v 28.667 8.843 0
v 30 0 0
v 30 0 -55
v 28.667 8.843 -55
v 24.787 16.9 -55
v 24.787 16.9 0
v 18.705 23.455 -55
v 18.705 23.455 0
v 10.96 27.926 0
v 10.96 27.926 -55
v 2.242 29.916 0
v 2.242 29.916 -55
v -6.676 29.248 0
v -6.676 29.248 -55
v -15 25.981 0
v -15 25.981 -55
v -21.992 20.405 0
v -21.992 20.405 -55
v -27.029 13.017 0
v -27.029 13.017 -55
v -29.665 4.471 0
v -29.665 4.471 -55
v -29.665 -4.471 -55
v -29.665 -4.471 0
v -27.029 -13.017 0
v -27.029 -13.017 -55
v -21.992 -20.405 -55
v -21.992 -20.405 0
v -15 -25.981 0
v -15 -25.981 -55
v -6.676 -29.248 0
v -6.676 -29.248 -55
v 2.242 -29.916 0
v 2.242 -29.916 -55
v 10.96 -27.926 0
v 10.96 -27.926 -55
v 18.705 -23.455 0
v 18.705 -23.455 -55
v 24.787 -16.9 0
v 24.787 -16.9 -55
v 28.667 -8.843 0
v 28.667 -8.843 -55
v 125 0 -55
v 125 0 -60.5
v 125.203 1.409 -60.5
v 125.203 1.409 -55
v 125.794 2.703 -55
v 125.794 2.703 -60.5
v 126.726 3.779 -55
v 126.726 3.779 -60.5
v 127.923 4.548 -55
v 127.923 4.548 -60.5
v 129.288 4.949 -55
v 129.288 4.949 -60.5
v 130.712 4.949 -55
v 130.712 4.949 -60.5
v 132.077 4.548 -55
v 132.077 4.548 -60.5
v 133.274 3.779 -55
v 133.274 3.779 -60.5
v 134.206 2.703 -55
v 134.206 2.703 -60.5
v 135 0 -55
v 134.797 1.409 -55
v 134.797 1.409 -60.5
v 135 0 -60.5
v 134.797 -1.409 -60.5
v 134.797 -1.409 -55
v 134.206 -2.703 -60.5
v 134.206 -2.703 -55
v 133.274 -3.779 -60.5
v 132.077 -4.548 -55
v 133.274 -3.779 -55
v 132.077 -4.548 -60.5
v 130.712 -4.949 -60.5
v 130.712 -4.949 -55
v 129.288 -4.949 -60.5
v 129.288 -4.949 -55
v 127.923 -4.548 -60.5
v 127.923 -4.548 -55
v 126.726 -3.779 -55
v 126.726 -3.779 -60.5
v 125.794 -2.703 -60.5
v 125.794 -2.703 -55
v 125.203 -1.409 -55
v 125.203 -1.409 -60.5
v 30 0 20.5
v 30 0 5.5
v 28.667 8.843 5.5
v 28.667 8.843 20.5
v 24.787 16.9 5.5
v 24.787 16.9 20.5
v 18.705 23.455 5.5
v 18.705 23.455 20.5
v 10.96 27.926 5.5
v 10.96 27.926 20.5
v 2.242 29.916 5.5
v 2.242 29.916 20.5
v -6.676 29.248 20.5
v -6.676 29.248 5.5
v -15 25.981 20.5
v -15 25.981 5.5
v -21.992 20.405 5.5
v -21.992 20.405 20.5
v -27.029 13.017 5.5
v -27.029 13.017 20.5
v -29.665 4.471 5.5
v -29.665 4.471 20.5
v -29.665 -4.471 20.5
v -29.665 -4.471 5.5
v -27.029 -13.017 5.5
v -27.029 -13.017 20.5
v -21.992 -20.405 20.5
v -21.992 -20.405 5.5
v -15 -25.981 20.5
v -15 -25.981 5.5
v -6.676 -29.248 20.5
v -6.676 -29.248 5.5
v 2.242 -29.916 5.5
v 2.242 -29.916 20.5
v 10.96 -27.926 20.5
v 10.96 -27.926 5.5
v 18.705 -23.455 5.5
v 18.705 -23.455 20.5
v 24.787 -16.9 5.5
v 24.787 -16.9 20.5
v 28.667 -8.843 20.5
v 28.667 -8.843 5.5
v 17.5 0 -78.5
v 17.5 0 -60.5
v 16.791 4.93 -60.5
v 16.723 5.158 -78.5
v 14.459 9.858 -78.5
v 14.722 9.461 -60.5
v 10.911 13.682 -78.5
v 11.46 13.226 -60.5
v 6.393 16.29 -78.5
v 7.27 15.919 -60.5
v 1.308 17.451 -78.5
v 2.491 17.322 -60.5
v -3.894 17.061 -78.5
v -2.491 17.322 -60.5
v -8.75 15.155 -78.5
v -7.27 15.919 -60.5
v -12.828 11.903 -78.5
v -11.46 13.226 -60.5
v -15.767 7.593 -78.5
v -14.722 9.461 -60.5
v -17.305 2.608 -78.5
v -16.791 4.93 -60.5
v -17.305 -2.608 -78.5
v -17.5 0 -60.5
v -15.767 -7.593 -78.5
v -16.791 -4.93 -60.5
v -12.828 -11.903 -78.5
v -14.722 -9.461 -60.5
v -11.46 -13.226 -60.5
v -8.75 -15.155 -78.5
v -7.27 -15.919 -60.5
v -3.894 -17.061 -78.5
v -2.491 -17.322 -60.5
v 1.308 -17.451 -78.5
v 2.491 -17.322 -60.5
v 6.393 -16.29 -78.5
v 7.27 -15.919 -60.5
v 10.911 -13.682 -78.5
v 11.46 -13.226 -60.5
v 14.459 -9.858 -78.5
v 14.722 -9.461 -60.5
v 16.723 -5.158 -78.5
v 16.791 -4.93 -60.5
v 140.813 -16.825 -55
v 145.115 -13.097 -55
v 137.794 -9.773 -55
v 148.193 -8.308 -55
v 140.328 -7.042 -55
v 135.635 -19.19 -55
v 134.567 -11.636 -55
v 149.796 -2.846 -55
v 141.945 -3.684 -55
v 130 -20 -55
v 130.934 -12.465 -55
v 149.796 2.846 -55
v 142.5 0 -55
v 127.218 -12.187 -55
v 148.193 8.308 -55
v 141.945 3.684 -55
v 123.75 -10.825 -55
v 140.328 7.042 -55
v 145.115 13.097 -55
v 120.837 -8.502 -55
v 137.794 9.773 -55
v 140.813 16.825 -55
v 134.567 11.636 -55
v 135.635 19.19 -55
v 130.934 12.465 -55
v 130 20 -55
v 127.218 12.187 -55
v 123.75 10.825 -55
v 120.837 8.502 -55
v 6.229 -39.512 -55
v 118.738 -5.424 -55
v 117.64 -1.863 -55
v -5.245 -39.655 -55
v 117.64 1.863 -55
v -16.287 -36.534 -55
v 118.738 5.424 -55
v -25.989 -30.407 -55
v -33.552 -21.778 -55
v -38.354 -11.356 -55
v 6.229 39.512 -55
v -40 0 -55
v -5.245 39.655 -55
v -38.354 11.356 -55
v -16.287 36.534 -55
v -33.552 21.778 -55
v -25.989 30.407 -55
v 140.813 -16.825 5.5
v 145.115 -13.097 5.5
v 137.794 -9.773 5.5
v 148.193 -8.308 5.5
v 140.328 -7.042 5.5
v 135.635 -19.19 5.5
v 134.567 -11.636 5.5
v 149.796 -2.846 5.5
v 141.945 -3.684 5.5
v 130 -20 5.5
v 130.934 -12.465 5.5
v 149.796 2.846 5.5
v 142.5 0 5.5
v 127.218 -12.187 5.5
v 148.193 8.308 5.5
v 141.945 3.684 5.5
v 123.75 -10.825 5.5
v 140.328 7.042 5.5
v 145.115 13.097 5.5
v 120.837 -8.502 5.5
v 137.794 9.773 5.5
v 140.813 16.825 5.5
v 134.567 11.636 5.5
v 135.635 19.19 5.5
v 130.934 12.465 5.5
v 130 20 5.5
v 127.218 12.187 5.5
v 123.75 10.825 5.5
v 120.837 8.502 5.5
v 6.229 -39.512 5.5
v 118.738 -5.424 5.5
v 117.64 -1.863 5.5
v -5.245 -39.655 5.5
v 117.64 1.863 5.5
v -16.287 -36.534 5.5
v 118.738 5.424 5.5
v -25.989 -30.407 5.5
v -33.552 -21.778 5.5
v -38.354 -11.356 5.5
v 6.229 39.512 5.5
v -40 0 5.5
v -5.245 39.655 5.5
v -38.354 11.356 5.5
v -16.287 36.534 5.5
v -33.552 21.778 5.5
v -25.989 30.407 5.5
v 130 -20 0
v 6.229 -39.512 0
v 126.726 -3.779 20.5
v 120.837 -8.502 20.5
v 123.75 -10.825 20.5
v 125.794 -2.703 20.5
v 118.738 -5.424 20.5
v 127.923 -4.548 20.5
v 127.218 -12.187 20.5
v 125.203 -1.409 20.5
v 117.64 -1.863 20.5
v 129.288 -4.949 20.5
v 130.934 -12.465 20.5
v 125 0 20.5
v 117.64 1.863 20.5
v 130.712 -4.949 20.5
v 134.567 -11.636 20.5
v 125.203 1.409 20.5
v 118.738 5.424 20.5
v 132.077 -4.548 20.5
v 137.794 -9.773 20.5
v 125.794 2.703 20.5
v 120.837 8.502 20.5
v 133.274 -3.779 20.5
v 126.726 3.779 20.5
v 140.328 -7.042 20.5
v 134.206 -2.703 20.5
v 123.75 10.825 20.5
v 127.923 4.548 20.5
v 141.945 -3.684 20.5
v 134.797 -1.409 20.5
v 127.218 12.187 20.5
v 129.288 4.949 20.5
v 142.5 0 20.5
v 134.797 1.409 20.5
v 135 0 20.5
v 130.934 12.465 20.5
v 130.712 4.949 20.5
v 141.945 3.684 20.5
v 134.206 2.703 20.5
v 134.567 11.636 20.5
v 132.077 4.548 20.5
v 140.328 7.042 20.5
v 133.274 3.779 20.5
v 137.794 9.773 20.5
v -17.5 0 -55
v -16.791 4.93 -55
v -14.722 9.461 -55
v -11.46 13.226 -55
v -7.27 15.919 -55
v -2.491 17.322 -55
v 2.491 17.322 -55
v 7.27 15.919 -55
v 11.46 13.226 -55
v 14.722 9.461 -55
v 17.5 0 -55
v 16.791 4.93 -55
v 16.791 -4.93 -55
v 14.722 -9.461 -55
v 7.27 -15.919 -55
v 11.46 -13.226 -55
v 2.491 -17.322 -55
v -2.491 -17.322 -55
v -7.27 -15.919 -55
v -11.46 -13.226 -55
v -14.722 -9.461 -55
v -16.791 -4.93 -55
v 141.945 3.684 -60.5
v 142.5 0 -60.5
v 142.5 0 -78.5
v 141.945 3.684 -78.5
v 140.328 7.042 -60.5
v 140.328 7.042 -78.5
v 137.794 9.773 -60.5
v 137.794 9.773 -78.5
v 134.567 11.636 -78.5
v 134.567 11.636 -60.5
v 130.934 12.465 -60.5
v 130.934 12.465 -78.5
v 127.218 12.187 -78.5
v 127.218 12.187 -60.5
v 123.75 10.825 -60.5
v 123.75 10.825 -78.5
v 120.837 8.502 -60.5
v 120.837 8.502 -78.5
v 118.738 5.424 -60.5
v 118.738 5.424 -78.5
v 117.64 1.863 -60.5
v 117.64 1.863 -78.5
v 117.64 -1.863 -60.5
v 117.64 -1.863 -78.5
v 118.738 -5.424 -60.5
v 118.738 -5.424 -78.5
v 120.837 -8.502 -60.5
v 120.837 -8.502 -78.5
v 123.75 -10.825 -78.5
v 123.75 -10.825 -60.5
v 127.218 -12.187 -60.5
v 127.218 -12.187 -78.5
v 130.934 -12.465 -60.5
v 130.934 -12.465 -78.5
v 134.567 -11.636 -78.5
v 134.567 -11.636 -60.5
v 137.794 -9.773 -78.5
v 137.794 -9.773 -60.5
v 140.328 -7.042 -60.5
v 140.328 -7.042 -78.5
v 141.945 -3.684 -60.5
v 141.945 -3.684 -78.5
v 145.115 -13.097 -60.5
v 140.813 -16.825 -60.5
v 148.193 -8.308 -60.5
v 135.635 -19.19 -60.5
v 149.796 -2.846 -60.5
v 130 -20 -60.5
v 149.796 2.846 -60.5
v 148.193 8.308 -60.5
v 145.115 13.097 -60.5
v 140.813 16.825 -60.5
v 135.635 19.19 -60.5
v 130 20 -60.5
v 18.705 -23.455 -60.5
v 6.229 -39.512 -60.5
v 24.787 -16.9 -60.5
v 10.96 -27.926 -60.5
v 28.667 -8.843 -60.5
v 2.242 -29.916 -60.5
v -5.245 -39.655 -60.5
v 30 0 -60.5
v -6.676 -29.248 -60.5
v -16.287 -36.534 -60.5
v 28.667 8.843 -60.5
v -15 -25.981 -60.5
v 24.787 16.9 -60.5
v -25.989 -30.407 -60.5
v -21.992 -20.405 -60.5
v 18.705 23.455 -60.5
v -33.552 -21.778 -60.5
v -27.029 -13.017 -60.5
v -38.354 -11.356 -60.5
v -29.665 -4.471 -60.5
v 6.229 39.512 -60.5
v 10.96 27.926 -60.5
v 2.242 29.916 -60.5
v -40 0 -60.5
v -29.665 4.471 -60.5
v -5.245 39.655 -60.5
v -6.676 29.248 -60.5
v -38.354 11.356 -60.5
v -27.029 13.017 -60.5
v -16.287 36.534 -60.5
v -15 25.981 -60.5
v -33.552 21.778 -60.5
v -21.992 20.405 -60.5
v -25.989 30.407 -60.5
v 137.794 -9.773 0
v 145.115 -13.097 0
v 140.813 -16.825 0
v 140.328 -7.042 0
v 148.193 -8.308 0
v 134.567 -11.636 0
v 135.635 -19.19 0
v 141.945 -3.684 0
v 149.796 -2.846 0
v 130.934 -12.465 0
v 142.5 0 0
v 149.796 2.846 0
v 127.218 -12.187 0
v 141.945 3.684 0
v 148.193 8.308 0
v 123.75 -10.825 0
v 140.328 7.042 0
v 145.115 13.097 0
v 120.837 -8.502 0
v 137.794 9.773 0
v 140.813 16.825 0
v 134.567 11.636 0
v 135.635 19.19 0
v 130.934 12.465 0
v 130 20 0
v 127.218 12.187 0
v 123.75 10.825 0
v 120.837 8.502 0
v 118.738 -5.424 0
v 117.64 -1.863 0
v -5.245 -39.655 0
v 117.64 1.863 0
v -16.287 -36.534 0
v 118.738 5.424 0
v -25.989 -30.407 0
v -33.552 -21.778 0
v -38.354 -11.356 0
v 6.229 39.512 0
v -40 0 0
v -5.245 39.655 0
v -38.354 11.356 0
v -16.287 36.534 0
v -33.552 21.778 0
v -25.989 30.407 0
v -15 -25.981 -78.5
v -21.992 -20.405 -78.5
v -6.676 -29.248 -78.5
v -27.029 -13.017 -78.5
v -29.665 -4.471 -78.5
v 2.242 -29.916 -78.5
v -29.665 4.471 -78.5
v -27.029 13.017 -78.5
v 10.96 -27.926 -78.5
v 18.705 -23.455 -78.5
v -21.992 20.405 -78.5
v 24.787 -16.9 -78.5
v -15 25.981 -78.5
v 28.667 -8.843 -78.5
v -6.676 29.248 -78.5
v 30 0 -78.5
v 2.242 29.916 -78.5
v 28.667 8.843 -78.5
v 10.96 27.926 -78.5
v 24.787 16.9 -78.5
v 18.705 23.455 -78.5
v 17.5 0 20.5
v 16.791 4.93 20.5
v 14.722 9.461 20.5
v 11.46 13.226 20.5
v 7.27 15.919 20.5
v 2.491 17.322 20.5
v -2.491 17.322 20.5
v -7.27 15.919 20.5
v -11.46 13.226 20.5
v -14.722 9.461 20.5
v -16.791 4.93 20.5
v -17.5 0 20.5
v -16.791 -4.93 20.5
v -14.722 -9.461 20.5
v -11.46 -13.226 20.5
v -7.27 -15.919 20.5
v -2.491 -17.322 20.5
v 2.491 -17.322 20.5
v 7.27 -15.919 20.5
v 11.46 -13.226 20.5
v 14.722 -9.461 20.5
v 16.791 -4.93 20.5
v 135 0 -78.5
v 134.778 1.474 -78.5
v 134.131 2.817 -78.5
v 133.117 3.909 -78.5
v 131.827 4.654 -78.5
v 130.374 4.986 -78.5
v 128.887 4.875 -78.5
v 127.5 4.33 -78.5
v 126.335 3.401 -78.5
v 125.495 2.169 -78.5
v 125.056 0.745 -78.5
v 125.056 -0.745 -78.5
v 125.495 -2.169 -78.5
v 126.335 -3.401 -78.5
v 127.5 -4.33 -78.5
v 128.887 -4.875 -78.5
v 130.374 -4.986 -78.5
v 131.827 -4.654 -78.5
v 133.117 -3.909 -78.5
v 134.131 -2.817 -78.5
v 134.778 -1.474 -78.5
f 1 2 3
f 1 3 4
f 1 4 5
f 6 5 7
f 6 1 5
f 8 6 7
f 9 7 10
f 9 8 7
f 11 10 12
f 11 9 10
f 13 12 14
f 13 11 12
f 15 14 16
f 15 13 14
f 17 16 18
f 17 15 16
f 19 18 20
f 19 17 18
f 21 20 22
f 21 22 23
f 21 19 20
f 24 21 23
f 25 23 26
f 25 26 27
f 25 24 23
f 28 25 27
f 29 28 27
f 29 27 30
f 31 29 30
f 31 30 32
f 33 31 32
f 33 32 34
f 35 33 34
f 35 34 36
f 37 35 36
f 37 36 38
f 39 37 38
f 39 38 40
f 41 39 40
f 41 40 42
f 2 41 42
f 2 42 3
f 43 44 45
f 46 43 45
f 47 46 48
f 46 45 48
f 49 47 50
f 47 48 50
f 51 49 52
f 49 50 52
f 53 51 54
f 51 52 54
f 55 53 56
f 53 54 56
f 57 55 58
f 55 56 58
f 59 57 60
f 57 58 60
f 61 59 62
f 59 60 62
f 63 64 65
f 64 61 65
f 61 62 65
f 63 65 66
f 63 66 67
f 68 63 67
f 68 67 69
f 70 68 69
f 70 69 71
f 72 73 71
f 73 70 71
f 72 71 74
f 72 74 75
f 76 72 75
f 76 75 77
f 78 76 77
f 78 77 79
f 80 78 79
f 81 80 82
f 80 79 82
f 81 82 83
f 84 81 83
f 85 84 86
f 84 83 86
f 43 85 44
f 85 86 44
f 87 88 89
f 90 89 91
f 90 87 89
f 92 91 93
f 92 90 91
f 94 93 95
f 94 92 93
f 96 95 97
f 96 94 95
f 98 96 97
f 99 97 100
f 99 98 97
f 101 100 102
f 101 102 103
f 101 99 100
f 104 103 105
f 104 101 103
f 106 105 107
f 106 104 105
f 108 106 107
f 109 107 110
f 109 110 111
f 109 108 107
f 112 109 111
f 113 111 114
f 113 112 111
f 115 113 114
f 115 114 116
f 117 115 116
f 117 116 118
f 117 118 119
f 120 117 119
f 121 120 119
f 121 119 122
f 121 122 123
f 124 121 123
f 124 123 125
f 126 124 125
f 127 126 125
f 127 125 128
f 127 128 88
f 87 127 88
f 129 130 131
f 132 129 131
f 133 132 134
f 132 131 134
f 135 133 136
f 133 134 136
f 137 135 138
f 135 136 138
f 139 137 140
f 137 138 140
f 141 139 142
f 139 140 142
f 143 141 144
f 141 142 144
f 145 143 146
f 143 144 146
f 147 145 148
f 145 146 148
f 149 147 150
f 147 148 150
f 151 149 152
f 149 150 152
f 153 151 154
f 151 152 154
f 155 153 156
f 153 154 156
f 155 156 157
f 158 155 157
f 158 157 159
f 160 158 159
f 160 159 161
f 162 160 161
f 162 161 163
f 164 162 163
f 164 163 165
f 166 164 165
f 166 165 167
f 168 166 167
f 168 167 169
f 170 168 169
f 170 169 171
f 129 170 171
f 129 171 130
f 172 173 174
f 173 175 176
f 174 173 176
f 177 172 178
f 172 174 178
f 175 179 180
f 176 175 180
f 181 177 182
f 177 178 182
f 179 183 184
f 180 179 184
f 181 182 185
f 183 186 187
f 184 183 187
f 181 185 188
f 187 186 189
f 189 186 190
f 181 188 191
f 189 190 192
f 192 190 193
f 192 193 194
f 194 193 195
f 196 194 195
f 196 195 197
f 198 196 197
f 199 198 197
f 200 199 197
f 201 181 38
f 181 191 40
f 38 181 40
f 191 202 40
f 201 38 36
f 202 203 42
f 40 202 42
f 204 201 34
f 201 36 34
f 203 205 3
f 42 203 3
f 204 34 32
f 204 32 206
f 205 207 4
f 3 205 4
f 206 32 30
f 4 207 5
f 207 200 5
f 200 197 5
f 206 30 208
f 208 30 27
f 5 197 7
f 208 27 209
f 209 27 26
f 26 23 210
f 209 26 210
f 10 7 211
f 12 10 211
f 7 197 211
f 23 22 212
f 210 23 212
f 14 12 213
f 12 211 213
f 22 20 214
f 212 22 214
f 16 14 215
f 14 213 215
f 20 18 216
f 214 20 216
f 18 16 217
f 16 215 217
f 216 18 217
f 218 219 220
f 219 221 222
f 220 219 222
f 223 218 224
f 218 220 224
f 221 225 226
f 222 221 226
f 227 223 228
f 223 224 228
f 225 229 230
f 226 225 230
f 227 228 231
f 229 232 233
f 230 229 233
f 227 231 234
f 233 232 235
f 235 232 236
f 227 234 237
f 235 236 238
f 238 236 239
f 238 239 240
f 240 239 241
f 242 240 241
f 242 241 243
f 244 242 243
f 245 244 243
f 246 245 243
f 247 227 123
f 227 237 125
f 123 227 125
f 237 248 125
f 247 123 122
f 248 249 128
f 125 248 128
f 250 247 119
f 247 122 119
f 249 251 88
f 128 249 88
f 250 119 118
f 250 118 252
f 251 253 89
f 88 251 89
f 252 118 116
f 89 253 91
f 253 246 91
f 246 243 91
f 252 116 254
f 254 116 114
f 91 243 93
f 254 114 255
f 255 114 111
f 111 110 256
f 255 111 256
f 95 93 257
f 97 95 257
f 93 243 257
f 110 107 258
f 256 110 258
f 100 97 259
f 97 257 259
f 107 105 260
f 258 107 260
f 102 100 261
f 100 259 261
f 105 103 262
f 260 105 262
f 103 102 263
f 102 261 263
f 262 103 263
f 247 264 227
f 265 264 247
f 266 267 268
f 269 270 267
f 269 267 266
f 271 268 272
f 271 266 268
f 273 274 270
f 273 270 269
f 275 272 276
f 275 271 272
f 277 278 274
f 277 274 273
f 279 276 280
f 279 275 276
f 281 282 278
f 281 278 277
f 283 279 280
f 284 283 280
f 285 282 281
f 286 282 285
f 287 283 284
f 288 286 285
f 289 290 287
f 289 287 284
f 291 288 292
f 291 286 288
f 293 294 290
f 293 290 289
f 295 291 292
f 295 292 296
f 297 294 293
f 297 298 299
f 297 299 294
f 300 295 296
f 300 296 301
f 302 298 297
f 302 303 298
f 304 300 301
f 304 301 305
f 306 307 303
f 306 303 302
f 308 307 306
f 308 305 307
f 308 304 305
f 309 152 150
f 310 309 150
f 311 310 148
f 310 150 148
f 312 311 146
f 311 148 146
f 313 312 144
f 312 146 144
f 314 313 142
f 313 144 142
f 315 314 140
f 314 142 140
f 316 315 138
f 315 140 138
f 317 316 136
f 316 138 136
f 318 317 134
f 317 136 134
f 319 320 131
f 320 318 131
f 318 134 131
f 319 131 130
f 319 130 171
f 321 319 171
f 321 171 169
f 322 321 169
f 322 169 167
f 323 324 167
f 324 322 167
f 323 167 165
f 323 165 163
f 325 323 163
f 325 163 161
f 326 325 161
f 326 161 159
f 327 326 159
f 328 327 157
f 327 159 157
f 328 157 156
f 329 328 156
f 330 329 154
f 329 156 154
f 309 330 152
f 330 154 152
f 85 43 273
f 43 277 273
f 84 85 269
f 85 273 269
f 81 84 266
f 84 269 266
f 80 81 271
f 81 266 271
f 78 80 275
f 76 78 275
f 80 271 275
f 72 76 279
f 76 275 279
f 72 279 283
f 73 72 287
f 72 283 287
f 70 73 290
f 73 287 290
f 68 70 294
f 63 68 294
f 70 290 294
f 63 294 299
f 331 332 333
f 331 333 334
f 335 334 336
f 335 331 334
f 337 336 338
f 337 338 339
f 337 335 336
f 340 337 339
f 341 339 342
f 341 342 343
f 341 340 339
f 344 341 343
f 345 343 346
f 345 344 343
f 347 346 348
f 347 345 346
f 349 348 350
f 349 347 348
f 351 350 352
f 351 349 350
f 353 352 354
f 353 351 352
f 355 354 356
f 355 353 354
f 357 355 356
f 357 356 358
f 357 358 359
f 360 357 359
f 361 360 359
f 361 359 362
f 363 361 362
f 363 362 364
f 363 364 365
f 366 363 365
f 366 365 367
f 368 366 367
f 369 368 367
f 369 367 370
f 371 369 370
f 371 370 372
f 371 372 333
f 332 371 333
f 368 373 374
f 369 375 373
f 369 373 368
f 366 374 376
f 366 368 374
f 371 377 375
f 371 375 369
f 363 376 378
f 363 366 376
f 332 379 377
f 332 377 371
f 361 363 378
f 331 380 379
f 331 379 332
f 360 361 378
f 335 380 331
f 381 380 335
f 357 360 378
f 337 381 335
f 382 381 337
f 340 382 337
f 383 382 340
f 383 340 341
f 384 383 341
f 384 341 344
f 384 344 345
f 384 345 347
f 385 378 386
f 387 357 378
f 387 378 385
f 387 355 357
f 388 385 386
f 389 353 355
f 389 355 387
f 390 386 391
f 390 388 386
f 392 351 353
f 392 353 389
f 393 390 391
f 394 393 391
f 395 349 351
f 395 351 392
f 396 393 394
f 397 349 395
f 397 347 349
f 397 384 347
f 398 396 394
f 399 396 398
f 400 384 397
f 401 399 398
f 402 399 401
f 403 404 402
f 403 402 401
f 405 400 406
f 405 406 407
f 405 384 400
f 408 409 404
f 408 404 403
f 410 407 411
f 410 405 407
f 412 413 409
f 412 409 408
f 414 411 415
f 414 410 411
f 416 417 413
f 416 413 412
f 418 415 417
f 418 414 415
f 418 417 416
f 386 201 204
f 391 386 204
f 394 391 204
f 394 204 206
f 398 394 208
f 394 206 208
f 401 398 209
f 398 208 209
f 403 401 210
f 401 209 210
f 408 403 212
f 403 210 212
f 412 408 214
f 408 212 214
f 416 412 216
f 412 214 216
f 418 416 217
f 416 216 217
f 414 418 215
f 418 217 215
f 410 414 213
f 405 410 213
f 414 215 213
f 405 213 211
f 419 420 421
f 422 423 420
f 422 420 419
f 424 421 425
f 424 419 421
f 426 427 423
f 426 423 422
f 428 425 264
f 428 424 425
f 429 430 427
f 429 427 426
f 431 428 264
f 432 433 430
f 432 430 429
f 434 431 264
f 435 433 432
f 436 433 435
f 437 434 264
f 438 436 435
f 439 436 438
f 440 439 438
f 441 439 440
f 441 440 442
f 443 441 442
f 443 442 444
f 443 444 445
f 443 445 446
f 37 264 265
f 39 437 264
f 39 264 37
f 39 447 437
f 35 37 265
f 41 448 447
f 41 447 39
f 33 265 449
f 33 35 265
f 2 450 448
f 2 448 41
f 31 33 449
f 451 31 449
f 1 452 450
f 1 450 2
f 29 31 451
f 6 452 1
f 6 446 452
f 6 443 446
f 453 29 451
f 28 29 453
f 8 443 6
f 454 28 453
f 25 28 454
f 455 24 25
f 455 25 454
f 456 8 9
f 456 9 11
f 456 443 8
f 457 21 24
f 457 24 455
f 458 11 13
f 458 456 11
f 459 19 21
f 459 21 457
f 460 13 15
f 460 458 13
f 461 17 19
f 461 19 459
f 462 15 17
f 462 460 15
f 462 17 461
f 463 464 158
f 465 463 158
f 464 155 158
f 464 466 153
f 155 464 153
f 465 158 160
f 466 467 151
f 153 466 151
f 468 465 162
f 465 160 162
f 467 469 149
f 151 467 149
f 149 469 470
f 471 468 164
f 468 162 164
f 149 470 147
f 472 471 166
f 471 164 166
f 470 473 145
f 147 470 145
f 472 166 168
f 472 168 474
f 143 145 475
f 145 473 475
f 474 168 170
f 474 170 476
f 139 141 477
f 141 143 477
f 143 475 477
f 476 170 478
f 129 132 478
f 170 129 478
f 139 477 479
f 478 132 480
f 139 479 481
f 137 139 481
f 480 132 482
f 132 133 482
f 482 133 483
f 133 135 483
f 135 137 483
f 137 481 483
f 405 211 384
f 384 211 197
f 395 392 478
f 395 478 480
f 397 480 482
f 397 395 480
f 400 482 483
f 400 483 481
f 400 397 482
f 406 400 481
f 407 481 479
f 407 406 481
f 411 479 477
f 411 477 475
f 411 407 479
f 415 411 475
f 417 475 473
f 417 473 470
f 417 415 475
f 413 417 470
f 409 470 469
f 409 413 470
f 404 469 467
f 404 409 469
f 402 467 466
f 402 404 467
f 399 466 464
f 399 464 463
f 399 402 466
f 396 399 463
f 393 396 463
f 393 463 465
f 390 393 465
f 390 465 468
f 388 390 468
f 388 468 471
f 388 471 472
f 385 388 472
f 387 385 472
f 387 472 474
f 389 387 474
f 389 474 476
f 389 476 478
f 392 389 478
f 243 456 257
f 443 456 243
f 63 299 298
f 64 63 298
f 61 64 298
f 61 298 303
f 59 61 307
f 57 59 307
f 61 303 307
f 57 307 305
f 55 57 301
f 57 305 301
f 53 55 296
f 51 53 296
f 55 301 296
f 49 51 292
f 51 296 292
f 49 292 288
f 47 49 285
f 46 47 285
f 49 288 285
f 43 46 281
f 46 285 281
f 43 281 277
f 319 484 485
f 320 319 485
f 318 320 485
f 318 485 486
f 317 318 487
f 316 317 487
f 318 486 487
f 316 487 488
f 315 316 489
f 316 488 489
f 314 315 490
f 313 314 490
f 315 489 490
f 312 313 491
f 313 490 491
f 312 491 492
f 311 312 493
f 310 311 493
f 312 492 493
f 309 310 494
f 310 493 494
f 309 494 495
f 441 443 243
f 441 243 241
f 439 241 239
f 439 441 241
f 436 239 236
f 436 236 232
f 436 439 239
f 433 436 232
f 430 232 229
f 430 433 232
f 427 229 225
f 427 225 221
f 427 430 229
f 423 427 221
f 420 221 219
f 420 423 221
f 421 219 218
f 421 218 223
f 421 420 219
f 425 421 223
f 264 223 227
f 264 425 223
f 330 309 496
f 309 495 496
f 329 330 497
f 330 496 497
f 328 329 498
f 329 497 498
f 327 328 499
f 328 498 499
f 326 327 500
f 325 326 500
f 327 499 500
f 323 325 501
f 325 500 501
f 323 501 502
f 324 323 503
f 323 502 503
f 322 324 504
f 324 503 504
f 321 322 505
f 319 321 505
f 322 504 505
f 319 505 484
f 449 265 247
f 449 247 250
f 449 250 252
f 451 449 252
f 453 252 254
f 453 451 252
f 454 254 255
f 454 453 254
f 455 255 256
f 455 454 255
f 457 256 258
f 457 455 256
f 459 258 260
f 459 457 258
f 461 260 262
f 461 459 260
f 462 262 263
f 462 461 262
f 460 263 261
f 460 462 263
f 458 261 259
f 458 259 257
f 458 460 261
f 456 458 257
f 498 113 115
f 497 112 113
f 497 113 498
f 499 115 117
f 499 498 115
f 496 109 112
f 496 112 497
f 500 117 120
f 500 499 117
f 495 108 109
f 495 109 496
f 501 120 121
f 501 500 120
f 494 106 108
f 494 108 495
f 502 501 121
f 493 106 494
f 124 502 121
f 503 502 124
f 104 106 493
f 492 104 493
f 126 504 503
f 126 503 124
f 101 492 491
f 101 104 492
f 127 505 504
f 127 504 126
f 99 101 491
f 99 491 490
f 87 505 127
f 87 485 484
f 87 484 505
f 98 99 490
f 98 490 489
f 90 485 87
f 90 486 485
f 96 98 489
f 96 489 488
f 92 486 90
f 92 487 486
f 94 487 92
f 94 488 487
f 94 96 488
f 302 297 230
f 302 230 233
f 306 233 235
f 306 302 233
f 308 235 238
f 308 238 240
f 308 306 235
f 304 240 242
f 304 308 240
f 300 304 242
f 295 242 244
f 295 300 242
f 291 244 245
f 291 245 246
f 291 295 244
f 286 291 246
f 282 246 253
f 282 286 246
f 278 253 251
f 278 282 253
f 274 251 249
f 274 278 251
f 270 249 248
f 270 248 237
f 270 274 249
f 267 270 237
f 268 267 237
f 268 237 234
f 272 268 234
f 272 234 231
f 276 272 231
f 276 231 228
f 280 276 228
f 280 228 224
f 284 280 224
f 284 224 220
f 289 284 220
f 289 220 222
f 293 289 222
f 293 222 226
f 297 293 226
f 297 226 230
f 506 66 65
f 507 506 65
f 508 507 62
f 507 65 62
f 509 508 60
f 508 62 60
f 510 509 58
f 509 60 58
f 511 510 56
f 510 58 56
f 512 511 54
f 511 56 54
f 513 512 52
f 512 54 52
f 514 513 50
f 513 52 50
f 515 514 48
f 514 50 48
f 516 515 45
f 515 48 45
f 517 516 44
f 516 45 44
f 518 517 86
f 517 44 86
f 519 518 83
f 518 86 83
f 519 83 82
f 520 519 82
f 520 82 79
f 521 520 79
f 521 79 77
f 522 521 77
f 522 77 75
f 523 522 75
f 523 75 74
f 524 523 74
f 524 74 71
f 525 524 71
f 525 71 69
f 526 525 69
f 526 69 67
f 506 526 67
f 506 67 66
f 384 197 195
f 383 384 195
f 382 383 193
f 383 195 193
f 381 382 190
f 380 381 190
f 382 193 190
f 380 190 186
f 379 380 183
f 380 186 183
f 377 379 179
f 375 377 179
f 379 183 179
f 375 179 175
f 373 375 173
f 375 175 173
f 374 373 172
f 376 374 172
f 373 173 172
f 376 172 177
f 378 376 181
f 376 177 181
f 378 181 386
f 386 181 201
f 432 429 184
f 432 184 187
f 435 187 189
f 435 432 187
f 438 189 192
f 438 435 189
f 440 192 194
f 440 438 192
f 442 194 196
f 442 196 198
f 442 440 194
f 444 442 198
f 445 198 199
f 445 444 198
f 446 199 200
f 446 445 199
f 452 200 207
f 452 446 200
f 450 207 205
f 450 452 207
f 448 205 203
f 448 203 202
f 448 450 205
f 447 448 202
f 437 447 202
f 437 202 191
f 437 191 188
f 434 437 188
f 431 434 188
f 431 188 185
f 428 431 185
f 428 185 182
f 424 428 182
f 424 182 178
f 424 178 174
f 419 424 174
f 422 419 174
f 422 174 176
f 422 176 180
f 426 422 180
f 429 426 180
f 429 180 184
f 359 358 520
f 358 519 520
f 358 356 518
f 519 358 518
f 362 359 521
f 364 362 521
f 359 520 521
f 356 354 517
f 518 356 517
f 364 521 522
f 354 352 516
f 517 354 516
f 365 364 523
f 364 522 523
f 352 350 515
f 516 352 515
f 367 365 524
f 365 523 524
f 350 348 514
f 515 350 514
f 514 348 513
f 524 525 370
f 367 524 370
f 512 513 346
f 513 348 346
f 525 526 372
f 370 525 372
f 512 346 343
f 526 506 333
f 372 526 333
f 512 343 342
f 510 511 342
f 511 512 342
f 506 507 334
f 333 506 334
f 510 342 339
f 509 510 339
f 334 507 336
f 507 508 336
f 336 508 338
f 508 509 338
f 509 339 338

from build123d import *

# Parameters (mm, degrees)
BOSS_EXTRUDE1_DEPTH = 5.5
SKETCH2_R           = 30
SKETCH2_R_2         = 17.5
SKETCH2_R_3         = 12.5
SKETCH2_R_4         = 5
BOSS_EXTRUDE2_DEPTH = 99
SKETCH3_R           = 17.5
SKETCH3_R_2         = 5
CUT_EXTRUDE1_DEPTH  = 99
SKETCH4_R           = 5
CUT_EXTRUDE2_DEPTH  = 99
SKETCH5_R           = 17.5
CUT_EXTRUDE3_DEPTH  = 99


with BuildPart() as part:
    # Sketch1 → Boss-Extrude1 (new body)
    with BuildSketch(Plane.XY):
        with BuildLine():
            Line((6.228918342, 39.512030779), (130, 20))
            ThreePointArc((130, 20), (150, 0), (130, -20))
            Line((130, -20), (6.228918342, -39.512030779))
            ThreePointArc((6.228918342, -39.512030779), (-40, 0), (6.228918342, 39.512030779))
        make_face()
    boss_extrude1 = extrude(amount=BOSS_EXTRUDE1_DEPTH)

    # Sketch2 → Boss-Extrude2 (add)
    with BuildSketch(Plane.XY.offset(20.5)):
        Circle(SKETCH2_R)
        Circle(SKETCH2_R_2, mode=Mode.SUBTRACT)
        with Locations((130, 0)):
            Circle(SKETCH2_R_3)
        with Locations((130, 0)):
            Circle(SKETCH2_R_4, mode=Mode.SUBTRACT)
    extrude(amount=-BOSS_EXTRUDE2_DEPTH)

    # Sketch3 → Cut-Extrude1 (cut)
    with BuildSketch(Plane.XY.offset(5.5)):
        Circle(SKETCH3_R)
        with Locations((130, 0)):
            Circle(SKETCH3_R_2)
    extrude(amount=-CUT_EXTRUDE1_DEPTH, mode=Mode.SUBTRACT)

    # Mirror5: Boss-Extrude1 across plane
    add(boss_extrude1.mirror(Plane.XY.offset(-27.5)))

    # Sketch4 → Cut-Extrude2 (cut)
    with BuildSketch(Plane(origin=(0, 0, -60.5), x_dir=(-1, 0, 0), z_dir=(0, 0, -1))):
        with Locations((-130, 0)):
            Circle(SKETCH4_R)
    extrude(amount=-CUT_EXTRUDE2_DEPTH, mode=Mode.SUBTRACT)

    # Sketch5 → Cut-Extrude3 (cut)
    with BuildSketch(Plane(origin=(0, 0, -60.5), x_dir=(-1, 0, 0), z_dir=(0, 0, -1))):
        Circle(SKETCH5_R)
    extrude(amount=-CUT_EXTRUDE3_DEPTH, mode=Mode.SUBTRACT)


solid = part.part
